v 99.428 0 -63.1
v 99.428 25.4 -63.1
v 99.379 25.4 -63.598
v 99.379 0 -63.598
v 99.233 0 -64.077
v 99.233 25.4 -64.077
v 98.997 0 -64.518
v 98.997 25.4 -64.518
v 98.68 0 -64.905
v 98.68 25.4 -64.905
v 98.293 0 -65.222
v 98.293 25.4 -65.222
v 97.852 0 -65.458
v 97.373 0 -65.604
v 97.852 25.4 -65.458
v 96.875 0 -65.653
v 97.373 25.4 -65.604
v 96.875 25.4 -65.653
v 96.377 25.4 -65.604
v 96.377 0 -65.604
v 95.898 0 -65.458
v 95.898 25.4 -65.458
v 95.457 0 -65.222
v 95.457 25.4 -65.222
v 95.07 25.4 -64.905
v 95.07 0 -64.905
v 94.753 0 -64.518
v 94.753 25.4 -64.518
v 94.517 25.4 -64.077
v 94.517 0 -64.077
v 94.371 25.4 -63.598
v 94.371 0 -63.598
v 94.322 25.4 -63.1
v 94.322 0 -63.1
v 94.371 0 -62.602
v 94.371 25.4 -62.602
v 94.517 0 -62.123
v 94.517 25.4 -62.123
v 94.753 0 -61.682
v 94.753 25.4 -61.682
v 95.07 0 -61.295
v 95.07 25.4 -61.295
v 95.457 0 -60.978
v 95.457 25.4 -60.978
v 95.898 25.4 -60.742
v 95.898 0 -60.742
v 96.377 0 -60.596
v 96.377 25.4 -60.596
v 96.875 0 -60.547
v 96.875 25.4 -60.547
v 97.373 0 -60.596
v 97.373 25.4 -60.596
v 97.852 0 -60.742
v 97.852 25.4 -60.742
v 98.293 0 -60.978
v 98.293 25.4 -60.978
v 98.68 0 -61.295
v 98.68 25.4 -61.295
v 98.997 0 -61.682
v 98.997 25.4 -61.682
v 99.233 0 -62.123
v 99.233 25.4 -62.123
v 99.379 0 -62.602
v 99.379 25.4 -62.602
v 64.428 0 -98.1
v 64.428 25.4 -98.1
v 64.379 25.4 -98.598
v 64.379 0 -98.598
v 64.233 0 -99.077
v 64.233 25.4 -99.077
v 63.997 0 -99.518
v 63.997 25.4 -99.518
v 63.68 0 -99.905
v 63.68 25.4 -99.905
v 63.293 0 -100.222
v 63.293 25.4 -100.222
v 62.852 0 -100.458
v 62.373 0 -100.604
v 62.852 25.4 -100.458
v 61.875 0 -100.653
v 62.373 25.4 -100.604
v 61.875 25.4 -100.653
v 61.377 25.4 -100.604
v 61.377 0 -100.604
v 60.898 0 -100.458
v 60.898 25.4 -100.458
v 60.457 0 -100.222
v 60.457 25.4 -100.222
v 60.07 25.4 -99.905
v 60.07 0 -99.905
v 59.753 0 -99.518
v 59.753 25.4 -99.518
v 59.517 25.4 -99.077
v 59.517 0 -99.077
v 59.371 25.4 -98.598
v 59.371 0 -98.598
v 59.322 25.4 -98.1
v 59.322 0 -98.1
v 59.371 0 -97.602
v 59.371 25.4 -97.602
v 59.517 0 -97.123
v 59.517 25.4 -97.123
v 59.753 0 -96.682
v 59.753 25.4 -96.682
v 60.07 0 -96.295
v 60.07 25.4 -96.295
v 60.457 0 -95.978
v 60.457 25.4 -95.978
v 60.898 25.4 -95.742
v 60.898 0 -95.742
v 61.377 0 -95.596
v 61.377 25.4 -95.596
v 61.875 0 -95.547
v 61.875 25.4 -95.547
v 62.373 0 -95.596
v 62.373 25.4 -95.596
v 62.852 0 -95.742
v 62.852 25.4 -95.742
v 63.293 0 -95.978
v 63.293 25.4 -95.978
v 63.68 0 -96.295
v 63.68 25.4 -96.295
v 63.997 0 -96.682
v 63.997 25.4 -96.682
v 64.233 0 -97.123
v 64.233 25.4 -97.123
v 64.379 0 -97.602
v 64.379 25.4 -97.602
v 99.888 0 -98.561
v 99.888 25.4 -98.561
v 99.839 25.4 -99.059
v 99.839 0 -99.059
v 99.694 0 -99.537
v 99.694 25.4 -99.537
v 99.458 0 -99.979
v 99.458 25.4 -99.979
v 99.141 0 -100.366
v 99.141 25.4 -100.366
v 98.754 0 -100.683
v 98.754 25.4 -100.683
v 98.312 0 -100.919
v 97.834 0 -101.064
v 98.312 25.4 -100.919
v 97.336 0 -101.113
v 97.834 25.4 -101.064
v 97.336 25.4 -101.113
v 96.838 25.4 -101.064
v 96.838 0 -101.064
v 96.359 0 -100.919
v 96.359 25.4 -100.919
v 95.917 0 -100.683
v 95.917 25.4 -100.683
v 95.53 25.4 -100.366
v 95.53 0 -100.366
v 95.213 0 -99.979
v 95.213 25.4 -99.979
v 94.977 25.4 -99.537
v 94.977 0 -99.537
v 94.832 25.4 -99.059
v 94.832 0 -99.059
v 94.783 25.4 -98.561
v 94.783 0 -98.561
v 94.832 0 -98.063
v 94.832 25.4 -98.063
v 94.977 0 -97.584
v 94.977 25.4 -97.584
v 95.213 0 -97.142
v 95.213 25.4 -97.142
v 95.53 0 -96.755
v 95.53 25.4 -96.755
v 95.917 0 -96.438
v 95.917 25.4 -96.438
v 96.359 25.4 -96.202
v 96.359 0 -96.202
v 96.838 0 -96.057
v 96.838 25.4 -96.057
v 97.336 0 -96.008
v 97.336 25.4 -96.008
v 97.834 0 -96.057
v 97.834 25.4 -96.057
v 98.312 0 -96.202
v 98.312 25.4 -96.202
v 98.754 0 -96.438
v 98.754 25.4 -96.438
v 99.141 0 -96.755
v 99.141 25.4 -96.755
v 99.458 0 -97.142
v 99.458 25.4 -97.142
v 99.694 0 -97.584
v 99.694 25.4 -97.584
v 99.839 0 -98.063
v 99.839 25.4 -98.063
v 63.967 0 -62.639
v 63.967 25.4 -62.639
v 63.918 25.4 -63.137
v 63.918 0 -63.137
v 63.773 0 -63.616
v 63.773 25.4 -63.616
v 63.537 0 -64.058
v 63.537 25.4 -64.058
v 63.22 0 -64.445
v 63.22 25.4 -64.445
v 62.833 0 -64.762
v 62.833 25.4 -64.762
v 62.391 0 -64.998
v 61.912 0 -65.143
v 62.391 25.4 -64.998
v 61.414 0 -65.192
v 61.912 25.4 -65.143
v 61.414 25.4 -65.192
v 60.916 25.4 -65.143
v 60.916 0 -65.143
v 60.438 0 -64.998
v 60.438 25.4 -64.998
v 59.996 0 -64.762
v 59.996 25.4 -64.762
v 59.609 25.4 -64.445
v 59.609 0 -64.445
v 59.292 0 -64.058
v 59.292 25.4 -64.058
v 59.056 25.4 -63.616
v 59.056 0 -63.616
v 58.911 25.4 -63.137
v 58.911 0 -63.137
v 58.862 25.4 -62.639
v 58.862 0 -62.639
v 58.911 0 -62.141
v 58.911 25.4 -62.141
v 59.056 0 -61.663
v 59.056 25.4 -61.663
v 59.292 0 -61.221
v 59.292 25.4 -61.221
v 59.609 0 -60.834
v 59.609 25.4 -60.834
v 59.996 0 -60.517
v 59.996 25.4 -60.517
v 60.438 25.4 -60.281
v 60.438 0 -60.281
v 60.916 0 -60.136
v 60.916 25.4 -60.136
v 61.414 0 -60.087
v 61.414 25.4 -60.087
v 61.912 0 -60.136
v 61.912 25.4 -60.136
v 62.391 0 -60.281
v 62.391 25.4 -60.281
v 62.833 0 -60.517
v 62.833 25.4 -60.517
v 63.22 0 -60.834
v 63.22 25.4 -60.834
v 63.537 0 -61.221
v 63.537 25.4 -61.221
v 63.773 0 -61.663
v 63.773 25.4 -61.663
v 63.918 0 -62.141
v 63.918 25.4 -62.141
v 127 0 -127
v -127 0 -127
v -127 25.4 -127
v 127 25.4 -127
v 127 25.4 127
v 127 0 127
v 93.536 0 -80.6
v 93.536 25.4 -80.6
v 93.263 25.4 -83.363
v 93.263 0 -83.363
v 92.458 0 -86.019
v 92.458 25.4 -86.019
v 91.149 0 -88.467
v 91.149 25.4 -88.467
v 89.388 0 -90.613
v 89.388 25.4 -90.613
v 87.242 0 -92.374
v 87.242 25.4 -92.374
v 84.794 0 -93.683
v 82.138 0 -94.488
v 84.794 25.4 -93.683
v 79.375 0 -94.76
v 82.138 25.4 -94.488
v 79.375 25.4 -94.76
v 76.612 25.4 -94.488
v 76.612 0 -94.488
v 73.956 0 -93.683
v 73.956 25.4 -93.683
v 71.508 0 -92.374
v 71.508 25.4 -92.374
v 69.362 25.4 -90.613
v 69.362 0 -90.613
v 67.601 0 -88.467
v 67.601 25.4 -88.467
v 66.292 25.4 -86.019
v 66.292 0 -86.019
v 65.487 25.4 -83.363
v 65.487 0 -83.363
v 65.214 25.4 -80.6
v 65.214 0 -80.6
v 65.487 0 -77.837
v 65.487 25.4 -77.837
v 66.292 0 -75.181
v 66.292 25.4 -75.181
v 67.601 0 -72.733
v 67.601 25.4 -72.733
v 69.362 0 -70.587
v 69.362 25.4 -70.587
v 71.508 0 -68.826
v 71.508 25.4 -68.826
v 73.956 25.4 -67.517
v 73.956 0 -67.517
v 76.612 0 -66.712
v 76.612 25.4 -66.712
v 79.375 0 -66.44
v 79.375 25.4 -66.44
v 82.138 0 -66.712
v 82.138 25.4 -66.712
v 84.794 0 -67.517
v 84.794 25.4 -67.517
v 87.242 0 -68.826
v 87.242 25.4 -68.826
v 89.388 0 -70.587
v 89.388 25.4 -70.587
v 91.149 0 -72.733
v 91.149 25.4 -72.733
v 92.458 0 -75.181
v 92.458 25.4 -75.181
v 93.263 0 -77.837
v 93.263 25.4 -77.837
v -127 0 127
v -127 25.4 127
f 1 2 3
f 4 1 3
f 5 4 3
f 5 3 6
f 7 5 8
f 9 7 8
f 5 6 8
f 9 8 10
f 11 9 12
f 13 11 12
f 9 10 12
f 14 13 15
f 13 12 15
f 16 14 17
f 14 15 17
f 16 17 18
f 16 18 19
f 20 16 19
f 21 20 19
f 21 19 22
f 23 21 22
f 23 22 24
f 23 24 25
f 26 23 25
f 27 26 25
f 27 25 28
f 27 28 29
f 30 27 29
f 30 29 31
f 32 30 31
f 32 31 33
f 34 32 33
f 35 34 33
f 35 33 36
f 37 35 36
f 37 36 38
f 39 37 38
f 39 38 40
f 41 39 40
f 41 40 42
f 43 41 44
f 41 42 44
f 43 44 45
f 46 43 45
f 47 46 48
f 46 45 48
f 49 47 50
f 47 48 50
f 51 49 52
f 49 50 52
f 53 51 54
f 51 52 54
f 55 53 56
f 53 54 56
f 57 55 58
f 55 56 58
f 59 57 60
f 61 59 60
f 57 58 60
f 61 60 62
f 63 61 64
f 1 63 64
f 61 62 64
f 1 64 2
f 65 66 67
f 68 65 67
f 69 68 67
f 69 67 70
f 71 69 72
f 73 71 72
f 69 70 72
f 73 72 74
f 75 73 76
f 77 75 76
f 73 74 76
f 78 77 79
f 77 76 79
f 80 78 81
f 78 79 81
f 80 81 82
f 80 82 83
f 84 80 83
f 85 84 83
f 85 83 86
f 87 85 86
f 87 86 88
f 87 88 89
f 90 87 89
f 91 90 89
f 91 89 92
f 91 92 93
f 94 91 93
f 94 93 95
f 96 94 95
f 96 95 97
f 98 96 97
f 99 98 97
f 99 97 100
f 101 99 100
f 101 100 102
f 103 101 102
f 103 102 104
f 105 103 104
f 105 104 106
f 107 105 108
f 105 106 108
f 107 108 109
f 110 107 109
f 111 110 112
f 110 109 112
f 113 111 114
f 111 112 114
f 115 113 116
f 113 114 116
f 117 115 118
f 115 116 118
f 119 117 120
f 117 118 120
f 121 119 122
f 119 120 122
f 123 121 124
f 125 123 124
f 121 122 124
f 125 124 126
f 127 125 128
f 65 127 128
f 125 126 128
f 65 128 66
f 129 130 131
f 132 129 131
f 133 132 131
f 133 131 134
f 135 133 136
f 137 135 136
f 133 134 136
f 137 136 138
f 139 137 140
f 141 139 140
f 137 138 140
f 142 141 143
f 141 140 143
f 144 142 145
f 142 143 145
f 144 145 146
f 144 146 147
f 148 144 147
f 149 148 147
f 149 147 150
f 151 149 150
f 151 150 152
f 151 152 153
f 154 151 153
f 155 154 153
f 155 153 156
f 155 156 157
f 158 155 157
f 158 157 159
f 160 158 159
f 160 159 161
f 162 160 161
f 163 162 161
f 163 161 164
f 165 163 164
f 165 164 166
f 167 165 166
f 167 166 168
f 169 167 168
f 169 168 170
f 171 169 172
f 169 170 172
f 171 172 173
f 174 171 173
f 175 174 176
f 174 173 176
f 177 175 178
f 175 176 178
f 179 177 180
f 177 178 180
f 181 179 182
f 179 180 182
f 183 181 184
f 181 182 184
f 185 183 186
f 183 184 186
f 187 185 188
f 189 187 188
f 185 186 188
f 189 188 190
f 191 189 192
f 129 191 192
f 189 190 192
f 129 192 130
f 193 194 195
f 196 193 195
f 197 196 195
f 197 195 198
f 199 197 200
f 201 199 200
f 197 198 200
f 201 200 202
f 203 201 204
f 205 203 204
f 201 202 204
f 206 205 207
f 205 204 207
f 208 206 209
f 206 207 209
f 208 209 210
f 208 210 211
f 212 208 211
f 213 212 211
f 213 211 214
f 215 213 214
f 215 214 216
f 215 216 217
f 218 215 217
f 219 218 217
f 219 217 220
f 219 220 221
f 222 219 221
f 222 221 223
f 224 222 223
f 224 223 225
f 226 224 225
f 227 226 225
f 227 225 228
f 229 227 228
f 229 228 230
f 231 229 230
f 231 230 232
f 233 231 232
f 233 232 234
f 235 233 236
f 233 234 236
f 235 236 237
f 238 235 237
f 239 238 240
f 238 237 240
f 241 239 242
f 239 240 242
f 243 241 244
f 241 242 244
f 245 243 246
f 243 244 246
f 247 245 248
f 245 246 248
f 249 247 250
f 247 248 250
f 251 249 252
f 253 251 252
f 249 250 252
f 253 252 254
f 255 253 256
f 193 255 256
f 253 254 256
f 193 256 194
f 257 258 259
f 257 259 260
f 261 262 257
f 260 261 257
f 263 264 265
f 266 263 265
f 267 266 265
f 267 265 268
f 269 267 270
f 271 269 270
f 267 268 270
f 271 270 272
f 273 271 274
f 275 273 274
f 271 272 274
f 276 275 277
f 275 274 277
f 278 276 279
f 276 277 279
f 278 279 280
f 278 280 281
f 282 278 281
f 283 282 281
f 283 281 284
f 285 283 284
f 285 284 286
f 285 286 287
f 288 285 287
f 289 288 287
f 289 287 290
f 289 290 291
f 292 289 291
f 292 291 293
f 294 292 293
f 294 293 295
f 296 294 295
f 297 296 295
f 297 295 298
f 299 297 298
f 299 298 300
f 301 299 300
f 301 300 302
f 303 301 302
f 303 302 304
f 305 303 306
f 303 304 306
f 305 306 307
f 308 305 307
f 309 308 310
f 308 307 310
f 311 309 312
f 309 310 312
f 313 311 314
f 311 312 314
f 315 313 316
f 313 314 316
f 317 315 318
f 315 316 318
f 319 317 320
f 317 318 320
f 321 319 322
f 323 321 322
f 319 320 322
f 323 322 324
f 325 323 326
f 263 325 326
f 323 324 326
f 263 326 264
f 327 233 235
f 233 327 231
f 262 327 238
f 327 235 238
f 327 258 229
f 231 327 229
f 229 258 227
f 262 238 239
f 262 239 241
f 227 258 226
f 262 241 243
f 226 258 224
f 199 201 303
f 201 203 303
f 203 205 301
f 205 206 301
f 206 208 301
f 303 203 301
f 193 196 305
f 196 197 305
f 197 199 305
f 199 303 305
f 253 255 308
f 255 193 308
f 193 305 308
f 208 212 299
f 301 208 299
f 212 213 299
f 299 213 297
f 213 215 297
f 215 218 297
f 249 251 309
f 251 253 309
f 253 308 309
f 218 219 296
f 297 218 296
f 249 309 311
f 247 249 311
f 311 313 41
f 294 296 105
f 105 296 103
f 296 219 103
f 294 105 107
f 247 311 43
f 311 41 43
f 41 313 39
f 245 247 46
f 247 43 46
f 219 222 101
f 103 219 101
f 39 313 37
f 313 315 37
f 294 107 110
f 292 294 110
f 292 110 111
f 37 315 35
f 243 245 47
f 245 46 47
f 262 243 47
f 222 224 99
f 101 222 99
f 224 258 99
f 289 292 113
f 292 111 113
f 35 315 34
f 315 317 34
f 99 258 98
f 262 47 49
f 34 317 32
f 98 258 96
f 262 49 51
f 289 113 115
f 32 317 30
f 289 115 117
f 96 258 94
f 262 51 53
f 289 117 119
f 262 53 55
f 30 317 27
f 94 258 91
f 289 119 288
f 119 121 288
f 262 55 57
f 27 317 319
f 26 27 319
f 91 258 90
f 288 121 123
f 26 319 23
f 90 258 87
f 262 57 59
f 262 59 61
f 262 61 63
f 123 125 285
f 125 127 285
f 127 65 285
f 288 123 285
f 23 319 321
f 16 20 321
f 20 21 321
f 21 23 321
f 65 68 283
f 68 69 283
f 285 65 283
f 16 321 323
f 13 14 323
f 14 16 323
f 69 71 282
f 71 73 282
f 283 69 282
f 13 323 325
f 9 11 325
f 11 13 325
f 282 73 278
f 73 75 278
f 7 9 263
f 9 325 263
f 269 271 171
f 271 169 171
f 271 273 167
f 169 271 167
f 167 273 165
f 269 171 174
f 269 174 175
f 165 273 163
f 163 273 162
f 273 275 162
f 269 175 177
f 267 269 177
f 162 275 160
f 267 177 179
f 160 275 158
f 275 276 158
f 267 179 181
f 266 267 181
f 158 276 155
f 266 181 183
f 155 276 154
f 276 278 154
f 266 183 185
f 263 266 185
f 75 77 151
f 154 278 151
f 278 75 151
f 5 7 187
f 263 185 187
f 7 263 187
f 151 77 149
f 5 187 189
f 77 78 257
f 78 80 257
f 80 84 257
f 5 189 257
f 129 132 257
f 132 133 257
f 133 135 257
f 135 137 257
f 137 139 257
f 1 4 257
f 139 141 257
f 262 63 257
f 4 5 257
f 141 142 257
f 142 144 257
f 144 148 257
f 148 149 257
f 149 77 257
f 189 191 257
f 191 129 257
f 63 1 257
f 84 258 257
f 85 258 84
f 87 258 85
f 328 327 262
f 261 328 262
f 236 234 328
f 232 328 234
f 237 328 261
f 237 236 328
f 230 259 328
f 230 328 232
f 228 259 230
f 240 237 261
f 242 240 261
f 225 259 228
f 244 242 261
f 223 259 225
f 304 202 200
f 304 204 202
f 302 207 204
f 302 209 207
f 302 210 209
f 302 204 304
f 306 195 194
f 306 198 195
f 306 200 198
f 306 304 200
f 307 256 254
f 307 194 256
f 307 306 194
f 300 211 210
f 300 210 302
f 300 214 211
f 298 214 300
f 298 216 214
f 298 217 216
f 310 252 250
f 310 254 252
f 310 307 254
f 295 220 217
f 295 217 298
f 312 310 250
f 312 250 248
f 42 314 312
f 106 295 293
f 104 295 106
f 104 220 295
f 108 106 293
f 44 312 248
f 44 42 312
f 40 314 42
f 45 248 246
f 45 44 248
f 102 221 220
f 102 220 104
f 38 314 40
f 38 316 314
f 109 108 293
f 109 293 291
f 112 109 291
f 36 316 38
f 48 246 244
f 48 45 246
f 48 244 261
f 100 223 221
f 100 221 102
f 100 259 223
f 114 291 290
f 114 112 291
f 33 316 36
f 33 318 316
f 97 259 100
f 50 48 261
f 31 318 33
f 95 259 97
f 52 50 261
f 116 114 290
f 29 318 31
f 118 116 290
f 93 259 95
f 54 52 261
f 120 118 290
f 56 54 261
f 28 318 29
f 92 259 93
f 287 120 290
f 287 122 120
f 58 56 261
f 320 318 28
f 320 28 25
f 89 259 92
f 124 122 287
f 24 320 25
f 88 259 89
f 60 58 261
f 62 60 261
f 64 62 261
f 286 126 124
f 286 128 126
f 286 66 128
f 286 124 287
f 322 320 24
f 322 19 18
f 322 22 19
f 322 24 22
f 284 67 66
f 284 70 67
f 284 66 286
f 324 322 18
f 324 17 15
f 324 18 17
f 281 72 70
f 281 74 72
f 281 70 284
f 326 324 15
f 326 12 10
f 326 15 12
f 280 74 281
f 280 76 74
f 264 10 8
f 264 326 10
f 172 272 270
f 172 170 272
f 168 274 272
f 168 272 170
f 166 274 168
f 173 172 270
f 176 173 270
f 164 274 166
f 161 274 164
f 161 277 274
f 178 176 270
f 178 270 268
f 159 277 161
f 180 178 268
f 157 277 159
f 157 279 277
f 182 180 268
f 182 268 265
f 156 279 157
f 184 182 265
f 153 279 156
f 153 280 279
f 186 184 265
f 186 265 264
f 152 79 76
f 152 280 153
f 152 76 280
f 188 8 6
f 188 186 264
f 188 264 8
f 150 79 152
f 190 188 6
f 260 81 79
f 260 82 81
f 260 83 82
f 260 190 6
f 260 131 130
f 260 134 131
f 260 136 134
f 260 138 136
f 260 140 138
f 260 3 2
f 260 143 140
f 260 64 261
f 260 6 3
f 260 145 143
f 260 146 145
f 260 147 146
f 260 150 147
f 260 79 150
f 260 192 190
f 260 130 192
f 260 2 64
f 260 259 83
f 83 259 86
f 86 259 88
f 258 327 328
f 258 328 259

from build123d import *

# Parameters (mm, degrees)
SKETCH1_W               = 254
SKETCH1_H               = 254
BOSS_EXTRUDE1_DEPTH     = 25.4
F_10_CLEARANCE_HOLE1_D  = 5.1054
F_1_1_115_DOWEL_HOLE1_D = 28.321


with BuildPart() as part:
    # Sketch1 → Boss-Extrude1 (new body)
    with BuildSketch(Plane(origin=(0, 0, 0), x_dir=(1, 0, 0), z_dir=(0, 1, 0))):
        Rectangle(SKETCH1_W, SKETCH1_H)
    extrude(amount=BOSS_EXTRUDE1_DEPTH)

    # #10 Clearance Hole1 (through all)
    with Locations(Plane(origin=(0, 0, 0), x_dir=(-1, 0, 0), z_dir=(0, -1, 0))):
        with Locations((-61.414487758, 62.639487758), (-97.335512242, 98.560512242), (-61.875, 98.1), (-96.875, 63.1)):
            Hole(F_10_CLEARANCE_HOLE1_D / 2)

    # 1 (1.115) Dowel Hole1 (through all)
    with Locations(Plane(origin=(0, 0, 0), x_dir=(-1, 0, 0), z_dir=(0, -1, 0))):
        with Locations((-79.375, 80.6)):
            Hole(F_1_1_115_DOWEL_HOLE1_D / 2)


solid = part.part
